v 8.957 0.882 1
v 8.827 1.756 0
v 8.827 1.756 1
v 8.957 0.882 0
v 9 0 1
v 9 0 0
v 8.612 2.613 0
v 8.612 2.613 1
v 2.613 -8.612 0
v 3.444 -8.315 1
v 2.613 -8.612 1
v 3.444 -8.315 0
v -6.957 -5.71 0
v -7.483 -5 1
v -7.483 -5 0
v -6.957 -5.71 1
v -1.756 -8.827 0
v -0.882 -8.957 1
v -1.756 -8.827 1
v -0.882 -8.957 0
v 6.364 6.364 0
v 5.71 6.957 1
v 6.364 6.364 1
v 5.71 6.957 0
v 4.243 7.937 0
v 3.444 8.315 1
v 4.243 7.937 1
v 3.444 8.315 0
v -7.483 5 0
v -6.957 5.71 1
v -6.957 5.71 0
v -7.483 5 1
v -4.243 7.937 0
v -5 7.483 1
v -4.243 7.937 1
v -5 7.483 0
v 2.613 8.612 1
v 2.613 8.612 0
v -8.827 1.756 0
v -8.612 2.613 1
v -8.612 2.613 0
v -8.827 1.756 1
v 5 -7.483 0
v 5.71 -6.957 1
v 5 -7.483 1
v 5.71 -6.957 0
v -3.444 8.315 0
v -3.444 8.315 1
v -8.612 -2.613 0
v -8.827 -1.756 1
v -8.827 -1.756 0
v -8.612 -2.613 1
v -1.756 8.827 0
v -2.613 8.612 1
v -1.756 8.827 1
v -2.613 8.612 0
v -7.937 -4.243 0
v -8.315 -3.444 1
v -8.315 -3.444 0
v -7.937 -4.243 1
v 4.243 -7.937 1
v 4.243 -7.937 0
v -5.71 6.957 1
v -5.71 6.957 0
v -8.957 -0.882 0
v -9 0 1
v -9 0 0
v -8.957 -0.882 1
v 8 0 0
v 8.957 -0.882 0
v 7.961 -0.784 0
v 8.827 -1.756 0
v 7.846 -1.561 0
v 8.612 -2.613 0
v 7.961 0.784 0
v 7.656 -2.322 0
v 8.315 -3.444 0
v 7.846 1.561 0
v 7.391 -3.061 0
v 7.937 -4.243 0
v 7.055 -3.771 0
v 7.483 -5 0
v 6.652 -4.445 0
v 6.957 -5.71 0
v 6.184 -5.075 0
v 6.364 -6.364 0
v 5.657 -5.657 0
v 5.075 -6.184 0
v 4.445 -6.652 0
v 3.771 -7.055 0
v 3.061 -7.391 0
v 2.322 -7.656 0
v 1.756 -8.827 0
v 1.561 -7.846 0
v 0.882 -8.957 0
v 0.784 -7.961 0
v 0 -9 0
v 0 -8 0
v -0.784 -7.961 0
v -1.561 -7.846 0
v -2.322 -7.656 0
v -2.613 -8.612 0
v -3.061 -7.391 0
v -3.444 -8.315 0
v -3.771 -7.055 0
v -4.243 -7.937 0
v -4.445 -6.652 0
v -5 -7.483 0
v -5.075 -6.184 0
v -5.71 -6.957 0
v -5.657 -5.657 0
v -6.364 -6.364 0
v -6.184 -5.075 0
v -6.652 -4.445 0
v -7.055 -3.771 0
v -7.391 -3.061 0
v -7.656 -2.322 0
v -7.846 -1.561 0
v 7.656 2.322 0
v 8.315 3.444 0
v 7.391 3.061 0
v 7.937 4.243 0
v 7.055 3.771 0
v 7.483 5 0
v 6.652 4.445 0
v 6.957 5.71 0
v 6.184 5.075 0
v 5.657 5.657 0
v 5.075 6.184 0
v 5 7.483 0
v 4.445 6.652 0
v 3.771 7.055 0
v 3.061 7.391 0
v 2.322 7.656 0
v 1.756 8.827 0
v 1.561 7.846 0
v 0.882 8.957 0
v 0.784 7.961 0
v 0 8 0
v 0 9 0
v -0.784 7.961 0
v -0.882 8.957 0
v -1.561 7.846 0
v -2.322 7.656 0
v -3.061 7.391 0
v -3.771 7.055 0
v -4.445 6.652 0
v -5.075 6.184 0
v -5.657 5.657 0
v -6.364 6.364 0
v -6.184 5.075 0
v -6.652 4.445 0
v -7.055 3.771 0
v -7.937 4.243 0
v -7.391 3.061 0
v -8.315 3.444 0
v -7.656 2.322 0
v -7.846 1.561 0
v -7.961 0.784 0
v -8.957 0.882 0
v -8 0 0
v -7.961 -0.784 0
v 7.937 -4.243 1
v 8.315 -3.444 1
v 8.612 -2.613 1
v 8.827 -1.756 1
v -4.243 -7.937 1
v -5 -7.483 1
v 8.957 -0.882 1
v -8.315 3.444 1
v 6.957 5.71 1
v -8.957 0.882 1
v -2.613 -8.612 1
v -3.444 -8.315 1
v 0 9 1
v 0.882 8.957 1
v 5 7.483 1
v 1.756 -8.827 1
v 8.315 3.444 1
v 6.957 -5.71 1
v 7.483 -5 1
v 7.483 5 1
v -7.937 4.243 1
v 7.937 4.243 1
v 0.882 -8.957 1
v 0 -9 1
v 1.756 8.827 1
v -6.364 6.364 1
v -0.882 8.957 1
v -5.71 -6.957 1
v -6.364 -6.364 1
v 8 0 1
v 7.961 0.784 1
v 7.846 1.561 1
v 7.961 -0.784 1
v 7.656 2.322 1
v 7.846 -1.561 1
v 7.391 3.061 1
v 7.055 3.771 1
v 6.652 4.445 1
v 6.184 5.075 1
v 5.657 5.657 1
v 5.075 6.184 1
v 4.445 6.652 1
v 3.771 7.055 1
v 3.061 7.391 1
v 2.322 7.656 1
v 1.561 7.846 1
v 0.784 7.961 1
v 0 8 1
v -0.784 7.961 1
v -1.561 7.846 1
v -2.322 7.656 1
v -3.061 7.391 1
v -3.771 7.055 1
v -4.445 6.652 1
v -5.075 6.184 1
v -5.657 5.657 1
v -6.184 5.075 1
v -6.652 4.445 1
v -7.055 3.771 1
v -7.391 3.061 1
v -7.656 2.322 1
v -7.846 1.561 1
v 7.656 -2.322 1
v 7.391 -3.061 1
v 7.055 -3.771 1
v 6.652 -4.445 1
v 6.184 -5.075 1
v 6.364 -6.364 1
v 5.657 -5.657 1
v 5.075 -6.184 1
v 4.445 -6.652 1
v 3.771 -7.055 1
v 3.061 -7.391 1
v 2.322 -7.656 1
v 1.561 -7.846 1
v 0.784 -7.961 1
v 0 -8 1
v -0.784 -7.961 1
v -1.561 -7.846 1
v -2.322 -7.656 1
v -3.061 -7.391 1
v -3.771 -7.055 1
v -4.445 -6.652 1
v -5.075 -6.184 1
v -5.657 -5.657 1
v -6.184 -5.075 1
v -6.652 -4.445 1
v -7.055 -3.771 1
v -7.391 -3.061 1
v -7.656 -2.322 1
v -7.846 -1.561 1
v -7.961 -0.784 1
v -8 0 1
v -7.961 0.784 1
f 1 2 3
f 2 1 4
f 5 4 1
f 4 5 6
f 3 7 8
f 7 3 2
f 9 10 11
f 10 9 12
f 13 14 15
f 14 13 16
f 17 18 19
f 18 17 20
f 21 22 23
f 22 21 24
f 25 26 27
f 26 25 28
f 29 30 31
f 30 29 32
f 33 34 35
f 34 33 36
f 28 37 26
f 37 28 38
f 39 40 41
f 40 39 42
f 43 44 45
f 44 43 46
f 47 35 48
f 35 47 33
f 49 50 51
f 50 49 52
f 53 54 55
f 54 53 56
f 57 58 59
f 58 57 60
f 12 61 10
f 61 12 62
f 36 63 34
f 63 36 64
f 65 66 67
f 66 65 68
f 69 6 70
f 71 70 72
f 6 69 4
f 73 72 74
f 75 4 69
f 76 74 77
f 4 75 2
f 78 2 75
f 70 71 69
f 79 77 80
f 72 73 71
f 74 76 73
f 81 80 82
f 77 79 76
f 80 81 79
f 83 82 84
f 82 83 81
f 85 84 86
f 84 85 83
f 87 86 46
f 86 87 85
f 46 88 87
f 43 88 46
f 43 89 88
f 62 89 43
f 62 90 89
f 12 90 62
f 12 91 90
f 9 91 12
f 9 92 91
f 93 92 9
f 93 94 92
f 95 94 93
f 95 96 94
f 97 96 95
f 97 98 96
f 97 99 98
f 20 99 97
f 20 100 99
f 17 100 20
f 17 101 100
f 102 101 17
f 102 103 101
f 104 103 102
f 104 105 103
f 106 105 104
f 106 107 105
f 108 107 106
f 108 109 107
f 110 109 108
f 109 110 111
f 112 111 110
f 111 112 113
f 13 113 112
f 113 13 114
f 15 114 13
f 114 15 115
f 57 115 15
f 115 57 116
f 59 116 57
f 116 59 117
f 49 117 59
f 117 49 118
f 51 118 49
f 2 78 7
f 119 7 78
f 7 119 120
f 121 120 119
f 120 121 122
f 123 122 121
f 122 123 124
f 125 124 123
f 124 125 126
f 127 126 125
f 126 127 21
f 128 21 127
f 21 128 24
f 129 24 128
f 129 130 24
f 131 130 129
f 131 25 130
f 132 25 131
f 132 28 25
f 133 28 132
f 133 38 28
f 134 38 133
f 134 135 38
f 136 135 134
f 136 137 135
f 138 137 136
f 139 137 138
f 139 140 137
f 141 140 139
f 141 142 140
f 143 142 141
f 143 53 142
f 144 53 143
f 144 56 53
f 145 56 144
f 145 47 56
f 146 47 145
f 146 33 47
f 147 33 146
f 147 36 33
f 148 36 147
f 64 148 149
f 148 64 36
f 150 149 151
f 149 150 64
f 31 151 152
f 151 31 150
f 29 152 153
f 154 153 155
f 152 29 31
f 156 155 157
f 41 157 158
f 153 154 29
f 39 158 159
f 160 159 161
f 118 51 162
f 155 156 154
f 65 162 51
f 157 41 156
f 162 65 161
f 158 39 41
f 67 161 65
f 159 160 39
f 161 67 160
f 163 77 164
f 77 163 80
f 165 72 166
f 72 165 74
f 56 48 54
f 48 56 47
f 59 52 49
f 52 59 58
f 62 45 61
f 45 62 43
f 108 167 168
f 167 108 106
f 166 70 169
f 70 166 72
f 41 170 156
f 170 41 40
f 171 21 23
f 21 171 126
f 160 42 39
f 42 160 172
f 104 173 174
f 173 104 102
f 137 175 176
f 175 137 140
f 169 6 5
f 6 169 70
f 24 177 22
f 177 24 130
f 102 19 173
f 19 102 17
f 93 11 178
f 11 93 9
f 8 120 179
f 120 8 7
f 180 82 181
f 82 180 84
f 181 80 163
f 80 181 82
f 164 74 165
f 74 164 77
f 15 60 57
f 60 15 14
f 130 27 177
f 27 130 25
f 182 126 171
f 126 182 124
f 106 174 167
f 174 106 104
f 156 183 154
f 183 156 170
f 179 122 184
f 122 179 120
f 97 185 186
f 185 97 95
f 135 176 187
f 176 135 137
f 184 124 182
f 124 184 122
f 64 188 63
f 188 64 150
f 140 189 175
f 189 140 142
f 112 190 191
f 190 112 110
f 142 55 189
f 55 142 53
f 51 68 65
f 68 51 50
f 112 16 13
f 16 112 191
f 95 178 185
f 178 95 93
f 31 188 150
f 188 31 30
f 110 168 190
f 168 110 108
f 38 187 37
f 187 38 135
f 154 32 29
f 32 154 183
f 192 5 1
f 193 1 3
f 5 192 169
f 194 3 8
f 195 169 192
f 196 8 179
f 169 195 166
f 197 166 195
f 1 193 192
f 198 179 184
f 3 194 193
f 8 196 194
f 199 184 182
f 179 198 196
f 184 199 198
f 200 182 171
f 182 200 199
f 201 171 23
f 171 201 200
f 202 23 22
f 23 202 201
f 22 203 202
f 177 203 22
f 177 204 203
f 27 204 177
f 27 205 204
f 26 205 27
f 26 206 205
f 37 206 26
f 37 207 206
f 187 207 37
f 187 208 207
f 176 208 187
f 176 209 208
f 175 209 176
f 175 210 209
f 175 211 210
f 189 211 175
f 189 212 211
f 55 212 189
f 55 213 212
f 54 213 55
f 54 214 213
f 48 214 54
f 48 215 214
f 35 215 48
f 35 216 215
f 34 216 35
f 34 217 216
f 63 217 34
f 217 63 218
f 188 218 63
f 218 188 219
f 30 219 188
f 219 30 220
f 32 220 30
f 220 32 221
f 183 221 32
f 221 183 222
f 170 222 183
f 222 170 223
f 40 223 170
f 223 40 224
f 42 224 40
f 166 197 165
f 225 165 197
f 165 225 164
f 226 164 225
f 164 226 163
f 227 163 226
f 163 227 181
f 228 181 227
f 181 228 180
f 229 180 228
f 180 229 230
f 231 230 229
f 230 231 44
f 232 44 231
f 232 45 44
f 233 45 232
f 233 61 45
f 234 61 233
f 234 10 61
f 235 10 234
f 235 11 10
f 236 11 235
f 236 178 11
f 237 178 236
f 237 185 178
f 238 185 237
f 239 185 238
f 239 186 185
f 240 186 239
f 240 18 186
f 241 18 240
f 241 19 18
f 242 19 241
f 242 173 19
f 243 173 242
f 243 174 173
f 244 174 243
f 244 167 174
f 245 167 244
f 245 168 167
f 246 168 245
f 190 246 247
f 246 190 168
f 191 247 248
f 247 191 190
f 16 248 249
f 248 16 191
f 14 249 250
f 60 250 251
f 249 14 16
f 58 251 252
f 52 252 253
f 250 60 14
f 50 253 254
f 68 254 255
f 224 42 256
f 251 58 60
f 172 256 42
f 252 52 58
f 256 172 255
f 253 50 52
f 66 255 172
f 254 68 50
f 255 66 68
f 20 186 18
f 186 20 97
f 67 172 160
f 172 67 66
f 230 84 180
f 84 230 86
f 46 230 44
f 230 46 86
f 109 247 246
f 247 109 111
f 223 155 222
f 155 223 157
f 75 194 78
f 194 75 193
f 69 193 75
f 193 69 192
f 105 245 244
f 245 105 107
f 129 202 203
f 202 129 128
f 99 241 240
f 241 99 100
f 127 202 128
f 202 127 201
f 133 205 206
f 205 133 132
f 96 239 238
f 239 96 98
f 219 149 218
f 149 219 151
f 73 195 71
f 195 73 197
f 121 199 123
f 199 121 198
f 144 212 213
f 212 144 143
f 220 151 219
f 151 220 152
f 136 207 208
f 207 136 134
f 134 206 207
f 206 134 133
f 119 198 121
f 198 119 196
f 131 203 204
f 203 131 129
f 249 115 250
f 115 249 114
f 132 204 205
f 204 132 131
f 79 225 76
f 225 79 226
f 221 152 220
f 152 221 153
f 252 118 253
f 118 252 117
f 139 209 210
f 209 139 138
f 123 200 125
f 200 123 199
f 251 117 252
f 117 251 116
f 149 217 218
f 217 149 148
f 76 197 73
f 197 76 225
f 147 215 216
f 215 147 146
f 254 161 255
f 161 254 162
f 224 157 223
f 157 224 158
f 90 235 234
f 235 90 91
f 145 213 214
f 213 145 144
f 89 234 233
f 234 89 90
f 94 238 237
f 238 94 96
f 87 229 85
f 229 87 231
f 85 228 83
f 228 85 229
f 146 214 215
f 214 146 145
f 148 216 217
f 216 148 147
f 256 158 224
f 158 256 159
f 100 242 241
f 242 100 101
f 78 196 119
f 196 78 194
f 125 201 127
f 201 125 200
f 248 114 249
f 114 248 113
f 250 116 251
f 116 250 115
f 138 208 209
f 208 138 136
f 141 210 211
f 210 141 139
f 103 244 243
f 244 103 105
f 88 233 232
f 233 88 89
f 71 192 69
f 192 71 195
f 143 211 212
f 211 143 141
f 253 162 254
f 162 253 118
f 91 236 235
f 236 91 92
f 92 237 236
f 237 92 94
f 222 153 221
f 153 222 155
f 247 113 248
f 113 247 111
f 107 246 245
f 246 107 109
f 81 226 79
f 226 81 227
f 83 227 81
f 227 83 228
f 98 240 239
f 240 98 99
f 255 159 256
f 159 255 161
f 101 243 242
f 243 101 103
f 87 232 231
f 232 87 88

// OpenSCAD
id=16;
od=id+2;
$fn=64;

difference() {
    cylinder(d=od, h=1);
    translate([0,0,-1])cylinder(d=id, h=3);
}
